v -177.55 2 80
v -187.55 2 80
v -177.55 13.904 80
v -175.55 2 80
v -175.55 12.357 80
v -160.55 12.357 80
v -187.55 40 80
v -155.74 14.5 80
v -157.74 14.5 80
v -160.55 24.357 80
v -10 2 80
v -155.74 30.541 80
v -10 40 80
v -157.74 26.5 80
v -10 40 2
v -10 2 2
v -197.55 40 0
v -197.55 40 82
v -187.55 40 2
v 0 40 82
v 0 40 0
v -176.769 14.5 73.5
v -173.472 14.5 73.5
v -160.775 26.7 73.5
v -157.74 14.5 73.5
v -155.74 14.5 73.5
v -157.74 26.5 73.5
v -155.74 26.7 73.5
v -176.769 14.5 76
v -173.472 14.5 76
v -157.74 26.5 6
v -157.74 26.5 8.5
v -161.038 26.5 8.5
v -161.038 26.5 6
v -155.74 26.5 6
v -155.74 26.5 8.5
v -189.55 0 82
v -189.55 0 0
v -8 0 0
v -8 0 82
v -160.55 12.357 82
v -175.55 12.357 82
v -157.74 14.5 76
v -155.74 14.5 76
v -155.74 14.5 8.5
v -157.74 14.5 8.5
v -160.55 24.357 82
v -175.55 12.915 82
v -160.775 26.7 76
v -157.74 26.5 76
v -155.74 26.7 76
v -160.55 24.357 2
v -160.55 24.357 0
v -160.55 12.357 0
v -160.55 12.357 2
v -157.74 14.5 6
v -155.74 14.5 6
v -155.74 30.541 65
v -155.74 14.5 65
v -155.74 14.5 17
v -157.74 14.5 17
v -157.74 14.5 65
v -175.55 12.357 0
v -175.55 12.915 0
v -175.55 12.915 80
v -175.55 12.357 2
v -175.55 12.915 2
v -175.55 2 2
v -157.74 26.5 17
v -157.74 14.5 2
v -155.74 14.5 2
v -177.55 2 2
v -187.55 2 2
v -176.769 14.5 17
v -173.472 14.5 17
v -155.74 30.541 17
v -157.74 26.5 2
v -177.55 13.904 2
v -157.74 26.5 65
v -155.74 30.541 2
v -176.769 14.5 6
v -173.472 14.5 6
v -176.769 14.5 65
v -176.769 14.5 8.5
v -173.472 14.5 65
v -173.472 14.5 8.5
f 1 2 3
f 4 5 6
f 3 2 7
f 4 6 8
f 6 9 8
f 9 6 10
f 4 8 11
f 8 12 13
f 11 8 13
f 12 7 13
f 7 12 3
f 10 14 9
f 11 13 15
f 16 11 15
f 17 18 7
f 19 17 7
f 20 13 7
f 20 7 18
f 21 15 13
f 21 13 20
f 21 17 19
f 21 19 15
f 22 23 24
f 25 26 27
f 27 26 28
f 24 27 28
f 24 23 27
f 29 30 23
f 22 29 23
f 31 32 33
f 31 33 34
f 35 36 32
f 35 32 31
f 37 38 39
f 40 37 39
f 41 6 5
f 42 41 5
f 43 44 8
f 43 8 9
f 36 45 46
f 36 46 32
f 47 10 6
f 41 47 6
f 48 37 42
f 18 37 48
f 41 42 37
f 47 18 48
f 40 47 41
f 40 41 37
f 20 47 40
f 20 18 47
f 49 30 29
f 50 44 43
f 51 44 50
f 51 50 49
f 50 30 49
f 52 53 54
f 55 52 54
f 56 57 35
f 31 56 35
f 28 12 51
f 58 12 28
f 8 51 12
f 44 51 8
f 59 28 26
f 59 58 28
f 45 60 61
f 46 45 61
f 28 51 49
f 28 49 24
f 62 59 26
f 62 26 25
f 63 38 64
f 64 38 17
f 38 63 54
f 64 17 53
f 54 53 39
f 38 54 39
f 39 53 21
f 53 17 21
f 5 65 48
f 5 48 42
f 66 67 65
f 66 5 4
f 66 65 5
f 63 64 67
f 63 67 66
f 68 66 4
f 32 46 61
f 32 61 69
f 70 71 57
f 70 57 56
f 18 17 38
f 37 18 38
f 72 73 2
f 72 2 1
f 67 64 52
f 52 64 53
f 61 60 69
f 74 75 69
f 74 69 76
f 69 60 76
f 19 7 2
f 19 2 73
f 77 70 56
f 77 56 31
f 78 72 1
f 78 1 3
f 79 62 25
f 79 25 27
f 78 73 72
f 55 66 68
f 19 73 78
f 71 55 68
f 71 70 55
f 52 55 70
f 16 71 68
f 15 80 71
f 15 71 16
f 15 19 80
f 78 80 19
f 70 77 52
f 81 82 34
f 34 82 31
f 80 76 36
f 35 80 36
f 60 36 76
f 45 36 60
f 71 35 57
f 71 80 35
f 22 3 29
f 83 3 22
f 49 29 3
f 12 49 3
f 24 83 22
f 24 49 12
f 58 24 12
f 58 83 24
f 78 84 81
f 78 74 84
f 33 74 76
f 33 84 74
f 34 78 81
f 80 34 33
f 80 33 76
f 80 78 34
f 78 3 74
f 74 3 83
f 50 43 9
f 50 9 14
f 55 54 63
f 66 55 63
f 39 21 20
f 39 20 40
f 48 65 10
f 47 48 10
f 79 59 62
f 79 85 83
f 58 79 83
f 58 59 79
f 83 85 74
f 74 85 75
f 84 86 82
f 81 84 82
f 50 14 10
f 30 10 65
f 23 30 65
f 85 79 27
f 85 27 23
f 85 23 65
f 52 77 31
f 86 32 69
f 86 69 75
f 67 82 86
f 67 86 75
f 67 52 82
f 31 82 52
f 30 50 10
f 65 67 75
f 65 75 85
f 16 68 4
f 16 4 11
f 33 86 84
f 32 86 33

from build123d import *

# Parameters (mm, degrees)
ESQUISSE1_W             = 197.55
ESQUISSE1_H             = 40
BOSS_EXTRU_1_DEPTH      = 82
ESQUISSE2_W             = 177.55
ESQUISSE2_H             = 78
ENL_V_MAT_EXTRU_1_DEPTH = 38
ENL_V_MAT_EXTRU_4_DEPTH = 82
BOSS_EXTRU_6_DEPTH      = 78.5
ESQUISSE8_W             = 48
ESQUISSE8_H             = 16.041036462
ENL_V_MAT_EXTRU_5_DEPTH = 26.4
ESQUISSE9_W             = 2.5
ESQUISSE9_H             = 12.2
ENL_V_MAT_EXTRU_6_DEPTH = 26.4
ESQUISSE10_W            = 2.5
ESQUISSE10_H            = 12
ENL_V_MAT_EXTRU_7_DEPTH = 26.4
ENL_V_MAT_EXTRU_9_DEPTH = 82


with BuildPart() as part:
    # Esquisse1 → Boss.-Extru.1 (new body)
    with BuildSketch(Plane.XY):
        with Locations((-98.775, 20)):
            Rectangle(ESQUISSE1_W, ESQUISSE1_H)
    extrude(amount=BOSS_EXTRU_1_DEPTH)

    # Esquisse2 → Enlèv. mat.-Extru.1 (cut)
    with BuildSketch(Plane(origin=(0, 40, 0), x_dir=(1, 0, 0), z_dir=(0, 1, 0))):
        with Locations((-98.775, -41)):
            Rectangle(ESQUISSE2_W, ESQUISSE2_H)
    extrude(amount=-ENL_V_MAT_EXTRU_1_DEPTH, mode=Mode.SUBTRACT)

    # Esquisse3 → Enlèv. mat.-Extru.4 (cut)
    with BuildSketch(Plane.XY):
        Polygon((-197.55, 40), (-189.55, 0), (-197.55, 0), align=None)
        Polygon((0, 40), (-8, 0), (0, 0), align=None)
    extrude(amount=ENL_V_MAT_EXTRU_4_DEPTH, mode=Mode.SUBTRACT)

    # Esquisse6 → Boss.-Extru.6 (add)
    with BuildSketch(Plane.XY.offset(2)):
        Polygon((-175.55, 12.914570305), (-175.55, 0.914570305), (-177.55, 0.914570305), (-177.55, 13.90441537), (-155.74, 30.541036462), (-155.74, 14.5), (-157.74, 14.5), (-157.74, 26.5), align=None)
    extrude(amount=BOSS_EXTRU_6_DEPTH)

    # Esquisse8 → Enlèv. mat.-Extru.5 (cut)
    with BuildSketch(Plane(origin=(-155.74, 0, 0), x_dir=(0, 0, -1), z_dir=(1, 0, 0))):
        with Locations((-41, 22.520518231)):
            Rectangle(ESQUISSE8_W, ESQUISSE8_H)
    extrude(amount=-ENL_V_MAT_EXTRU_5_DEPTH, mode=Mode.SUBTRACT)

    # Esquisse9 → Enlèv. mat.-Extru.6 (cut)
    with BuildSketch(Plane(origin=(-155.74, 0, 0), x_dir=(0, 0, -1), z_dir=(1, 0, 0))):
        with Locations((-74.75, 20.6)):
            Rectangle(ESQUISSE9_W, ESQUISSE9_H)
    extrude(amount=-ENL_V_MAT_EXTRU_6_DEPTH, mode=Mode.SUBTRACT)

    # Esquisse10 → Enlèv. mat.-Extru.7 (cut)
    with BuildSketch(Plane(origin=(-155.74, 0, 0), x_dir=(0, 0, -1), z_dir=(1, 0, 0))):
        with Locations((-7.25, 20.5)):
            Rectangle(ESQUISSE10_W, ESQUISSE10_H)
    extrude(amount=-ENL_V_MAT_EXTRU_7_DEPTH, mode=Mode.SUBTRACT)

    # Esquisse11 → Enlèv. mat.-Extru.9 (cut)
    with BuildSketch(Plane(origin=(0, 0, 0), x_dir=(-1, 0, 0), z_dir=(0, 0, -1))):
        Polygon((175.55, 12.914570305), (160.55, 24.356538044), (160.55, 12.356538044), (175.55, 12.356538044), align=None)
    extrude(amount=-ENL_V_MAT_EXTRU_9_DEPTH, mode=Mode.SUBTRACT)


solid = part.part
